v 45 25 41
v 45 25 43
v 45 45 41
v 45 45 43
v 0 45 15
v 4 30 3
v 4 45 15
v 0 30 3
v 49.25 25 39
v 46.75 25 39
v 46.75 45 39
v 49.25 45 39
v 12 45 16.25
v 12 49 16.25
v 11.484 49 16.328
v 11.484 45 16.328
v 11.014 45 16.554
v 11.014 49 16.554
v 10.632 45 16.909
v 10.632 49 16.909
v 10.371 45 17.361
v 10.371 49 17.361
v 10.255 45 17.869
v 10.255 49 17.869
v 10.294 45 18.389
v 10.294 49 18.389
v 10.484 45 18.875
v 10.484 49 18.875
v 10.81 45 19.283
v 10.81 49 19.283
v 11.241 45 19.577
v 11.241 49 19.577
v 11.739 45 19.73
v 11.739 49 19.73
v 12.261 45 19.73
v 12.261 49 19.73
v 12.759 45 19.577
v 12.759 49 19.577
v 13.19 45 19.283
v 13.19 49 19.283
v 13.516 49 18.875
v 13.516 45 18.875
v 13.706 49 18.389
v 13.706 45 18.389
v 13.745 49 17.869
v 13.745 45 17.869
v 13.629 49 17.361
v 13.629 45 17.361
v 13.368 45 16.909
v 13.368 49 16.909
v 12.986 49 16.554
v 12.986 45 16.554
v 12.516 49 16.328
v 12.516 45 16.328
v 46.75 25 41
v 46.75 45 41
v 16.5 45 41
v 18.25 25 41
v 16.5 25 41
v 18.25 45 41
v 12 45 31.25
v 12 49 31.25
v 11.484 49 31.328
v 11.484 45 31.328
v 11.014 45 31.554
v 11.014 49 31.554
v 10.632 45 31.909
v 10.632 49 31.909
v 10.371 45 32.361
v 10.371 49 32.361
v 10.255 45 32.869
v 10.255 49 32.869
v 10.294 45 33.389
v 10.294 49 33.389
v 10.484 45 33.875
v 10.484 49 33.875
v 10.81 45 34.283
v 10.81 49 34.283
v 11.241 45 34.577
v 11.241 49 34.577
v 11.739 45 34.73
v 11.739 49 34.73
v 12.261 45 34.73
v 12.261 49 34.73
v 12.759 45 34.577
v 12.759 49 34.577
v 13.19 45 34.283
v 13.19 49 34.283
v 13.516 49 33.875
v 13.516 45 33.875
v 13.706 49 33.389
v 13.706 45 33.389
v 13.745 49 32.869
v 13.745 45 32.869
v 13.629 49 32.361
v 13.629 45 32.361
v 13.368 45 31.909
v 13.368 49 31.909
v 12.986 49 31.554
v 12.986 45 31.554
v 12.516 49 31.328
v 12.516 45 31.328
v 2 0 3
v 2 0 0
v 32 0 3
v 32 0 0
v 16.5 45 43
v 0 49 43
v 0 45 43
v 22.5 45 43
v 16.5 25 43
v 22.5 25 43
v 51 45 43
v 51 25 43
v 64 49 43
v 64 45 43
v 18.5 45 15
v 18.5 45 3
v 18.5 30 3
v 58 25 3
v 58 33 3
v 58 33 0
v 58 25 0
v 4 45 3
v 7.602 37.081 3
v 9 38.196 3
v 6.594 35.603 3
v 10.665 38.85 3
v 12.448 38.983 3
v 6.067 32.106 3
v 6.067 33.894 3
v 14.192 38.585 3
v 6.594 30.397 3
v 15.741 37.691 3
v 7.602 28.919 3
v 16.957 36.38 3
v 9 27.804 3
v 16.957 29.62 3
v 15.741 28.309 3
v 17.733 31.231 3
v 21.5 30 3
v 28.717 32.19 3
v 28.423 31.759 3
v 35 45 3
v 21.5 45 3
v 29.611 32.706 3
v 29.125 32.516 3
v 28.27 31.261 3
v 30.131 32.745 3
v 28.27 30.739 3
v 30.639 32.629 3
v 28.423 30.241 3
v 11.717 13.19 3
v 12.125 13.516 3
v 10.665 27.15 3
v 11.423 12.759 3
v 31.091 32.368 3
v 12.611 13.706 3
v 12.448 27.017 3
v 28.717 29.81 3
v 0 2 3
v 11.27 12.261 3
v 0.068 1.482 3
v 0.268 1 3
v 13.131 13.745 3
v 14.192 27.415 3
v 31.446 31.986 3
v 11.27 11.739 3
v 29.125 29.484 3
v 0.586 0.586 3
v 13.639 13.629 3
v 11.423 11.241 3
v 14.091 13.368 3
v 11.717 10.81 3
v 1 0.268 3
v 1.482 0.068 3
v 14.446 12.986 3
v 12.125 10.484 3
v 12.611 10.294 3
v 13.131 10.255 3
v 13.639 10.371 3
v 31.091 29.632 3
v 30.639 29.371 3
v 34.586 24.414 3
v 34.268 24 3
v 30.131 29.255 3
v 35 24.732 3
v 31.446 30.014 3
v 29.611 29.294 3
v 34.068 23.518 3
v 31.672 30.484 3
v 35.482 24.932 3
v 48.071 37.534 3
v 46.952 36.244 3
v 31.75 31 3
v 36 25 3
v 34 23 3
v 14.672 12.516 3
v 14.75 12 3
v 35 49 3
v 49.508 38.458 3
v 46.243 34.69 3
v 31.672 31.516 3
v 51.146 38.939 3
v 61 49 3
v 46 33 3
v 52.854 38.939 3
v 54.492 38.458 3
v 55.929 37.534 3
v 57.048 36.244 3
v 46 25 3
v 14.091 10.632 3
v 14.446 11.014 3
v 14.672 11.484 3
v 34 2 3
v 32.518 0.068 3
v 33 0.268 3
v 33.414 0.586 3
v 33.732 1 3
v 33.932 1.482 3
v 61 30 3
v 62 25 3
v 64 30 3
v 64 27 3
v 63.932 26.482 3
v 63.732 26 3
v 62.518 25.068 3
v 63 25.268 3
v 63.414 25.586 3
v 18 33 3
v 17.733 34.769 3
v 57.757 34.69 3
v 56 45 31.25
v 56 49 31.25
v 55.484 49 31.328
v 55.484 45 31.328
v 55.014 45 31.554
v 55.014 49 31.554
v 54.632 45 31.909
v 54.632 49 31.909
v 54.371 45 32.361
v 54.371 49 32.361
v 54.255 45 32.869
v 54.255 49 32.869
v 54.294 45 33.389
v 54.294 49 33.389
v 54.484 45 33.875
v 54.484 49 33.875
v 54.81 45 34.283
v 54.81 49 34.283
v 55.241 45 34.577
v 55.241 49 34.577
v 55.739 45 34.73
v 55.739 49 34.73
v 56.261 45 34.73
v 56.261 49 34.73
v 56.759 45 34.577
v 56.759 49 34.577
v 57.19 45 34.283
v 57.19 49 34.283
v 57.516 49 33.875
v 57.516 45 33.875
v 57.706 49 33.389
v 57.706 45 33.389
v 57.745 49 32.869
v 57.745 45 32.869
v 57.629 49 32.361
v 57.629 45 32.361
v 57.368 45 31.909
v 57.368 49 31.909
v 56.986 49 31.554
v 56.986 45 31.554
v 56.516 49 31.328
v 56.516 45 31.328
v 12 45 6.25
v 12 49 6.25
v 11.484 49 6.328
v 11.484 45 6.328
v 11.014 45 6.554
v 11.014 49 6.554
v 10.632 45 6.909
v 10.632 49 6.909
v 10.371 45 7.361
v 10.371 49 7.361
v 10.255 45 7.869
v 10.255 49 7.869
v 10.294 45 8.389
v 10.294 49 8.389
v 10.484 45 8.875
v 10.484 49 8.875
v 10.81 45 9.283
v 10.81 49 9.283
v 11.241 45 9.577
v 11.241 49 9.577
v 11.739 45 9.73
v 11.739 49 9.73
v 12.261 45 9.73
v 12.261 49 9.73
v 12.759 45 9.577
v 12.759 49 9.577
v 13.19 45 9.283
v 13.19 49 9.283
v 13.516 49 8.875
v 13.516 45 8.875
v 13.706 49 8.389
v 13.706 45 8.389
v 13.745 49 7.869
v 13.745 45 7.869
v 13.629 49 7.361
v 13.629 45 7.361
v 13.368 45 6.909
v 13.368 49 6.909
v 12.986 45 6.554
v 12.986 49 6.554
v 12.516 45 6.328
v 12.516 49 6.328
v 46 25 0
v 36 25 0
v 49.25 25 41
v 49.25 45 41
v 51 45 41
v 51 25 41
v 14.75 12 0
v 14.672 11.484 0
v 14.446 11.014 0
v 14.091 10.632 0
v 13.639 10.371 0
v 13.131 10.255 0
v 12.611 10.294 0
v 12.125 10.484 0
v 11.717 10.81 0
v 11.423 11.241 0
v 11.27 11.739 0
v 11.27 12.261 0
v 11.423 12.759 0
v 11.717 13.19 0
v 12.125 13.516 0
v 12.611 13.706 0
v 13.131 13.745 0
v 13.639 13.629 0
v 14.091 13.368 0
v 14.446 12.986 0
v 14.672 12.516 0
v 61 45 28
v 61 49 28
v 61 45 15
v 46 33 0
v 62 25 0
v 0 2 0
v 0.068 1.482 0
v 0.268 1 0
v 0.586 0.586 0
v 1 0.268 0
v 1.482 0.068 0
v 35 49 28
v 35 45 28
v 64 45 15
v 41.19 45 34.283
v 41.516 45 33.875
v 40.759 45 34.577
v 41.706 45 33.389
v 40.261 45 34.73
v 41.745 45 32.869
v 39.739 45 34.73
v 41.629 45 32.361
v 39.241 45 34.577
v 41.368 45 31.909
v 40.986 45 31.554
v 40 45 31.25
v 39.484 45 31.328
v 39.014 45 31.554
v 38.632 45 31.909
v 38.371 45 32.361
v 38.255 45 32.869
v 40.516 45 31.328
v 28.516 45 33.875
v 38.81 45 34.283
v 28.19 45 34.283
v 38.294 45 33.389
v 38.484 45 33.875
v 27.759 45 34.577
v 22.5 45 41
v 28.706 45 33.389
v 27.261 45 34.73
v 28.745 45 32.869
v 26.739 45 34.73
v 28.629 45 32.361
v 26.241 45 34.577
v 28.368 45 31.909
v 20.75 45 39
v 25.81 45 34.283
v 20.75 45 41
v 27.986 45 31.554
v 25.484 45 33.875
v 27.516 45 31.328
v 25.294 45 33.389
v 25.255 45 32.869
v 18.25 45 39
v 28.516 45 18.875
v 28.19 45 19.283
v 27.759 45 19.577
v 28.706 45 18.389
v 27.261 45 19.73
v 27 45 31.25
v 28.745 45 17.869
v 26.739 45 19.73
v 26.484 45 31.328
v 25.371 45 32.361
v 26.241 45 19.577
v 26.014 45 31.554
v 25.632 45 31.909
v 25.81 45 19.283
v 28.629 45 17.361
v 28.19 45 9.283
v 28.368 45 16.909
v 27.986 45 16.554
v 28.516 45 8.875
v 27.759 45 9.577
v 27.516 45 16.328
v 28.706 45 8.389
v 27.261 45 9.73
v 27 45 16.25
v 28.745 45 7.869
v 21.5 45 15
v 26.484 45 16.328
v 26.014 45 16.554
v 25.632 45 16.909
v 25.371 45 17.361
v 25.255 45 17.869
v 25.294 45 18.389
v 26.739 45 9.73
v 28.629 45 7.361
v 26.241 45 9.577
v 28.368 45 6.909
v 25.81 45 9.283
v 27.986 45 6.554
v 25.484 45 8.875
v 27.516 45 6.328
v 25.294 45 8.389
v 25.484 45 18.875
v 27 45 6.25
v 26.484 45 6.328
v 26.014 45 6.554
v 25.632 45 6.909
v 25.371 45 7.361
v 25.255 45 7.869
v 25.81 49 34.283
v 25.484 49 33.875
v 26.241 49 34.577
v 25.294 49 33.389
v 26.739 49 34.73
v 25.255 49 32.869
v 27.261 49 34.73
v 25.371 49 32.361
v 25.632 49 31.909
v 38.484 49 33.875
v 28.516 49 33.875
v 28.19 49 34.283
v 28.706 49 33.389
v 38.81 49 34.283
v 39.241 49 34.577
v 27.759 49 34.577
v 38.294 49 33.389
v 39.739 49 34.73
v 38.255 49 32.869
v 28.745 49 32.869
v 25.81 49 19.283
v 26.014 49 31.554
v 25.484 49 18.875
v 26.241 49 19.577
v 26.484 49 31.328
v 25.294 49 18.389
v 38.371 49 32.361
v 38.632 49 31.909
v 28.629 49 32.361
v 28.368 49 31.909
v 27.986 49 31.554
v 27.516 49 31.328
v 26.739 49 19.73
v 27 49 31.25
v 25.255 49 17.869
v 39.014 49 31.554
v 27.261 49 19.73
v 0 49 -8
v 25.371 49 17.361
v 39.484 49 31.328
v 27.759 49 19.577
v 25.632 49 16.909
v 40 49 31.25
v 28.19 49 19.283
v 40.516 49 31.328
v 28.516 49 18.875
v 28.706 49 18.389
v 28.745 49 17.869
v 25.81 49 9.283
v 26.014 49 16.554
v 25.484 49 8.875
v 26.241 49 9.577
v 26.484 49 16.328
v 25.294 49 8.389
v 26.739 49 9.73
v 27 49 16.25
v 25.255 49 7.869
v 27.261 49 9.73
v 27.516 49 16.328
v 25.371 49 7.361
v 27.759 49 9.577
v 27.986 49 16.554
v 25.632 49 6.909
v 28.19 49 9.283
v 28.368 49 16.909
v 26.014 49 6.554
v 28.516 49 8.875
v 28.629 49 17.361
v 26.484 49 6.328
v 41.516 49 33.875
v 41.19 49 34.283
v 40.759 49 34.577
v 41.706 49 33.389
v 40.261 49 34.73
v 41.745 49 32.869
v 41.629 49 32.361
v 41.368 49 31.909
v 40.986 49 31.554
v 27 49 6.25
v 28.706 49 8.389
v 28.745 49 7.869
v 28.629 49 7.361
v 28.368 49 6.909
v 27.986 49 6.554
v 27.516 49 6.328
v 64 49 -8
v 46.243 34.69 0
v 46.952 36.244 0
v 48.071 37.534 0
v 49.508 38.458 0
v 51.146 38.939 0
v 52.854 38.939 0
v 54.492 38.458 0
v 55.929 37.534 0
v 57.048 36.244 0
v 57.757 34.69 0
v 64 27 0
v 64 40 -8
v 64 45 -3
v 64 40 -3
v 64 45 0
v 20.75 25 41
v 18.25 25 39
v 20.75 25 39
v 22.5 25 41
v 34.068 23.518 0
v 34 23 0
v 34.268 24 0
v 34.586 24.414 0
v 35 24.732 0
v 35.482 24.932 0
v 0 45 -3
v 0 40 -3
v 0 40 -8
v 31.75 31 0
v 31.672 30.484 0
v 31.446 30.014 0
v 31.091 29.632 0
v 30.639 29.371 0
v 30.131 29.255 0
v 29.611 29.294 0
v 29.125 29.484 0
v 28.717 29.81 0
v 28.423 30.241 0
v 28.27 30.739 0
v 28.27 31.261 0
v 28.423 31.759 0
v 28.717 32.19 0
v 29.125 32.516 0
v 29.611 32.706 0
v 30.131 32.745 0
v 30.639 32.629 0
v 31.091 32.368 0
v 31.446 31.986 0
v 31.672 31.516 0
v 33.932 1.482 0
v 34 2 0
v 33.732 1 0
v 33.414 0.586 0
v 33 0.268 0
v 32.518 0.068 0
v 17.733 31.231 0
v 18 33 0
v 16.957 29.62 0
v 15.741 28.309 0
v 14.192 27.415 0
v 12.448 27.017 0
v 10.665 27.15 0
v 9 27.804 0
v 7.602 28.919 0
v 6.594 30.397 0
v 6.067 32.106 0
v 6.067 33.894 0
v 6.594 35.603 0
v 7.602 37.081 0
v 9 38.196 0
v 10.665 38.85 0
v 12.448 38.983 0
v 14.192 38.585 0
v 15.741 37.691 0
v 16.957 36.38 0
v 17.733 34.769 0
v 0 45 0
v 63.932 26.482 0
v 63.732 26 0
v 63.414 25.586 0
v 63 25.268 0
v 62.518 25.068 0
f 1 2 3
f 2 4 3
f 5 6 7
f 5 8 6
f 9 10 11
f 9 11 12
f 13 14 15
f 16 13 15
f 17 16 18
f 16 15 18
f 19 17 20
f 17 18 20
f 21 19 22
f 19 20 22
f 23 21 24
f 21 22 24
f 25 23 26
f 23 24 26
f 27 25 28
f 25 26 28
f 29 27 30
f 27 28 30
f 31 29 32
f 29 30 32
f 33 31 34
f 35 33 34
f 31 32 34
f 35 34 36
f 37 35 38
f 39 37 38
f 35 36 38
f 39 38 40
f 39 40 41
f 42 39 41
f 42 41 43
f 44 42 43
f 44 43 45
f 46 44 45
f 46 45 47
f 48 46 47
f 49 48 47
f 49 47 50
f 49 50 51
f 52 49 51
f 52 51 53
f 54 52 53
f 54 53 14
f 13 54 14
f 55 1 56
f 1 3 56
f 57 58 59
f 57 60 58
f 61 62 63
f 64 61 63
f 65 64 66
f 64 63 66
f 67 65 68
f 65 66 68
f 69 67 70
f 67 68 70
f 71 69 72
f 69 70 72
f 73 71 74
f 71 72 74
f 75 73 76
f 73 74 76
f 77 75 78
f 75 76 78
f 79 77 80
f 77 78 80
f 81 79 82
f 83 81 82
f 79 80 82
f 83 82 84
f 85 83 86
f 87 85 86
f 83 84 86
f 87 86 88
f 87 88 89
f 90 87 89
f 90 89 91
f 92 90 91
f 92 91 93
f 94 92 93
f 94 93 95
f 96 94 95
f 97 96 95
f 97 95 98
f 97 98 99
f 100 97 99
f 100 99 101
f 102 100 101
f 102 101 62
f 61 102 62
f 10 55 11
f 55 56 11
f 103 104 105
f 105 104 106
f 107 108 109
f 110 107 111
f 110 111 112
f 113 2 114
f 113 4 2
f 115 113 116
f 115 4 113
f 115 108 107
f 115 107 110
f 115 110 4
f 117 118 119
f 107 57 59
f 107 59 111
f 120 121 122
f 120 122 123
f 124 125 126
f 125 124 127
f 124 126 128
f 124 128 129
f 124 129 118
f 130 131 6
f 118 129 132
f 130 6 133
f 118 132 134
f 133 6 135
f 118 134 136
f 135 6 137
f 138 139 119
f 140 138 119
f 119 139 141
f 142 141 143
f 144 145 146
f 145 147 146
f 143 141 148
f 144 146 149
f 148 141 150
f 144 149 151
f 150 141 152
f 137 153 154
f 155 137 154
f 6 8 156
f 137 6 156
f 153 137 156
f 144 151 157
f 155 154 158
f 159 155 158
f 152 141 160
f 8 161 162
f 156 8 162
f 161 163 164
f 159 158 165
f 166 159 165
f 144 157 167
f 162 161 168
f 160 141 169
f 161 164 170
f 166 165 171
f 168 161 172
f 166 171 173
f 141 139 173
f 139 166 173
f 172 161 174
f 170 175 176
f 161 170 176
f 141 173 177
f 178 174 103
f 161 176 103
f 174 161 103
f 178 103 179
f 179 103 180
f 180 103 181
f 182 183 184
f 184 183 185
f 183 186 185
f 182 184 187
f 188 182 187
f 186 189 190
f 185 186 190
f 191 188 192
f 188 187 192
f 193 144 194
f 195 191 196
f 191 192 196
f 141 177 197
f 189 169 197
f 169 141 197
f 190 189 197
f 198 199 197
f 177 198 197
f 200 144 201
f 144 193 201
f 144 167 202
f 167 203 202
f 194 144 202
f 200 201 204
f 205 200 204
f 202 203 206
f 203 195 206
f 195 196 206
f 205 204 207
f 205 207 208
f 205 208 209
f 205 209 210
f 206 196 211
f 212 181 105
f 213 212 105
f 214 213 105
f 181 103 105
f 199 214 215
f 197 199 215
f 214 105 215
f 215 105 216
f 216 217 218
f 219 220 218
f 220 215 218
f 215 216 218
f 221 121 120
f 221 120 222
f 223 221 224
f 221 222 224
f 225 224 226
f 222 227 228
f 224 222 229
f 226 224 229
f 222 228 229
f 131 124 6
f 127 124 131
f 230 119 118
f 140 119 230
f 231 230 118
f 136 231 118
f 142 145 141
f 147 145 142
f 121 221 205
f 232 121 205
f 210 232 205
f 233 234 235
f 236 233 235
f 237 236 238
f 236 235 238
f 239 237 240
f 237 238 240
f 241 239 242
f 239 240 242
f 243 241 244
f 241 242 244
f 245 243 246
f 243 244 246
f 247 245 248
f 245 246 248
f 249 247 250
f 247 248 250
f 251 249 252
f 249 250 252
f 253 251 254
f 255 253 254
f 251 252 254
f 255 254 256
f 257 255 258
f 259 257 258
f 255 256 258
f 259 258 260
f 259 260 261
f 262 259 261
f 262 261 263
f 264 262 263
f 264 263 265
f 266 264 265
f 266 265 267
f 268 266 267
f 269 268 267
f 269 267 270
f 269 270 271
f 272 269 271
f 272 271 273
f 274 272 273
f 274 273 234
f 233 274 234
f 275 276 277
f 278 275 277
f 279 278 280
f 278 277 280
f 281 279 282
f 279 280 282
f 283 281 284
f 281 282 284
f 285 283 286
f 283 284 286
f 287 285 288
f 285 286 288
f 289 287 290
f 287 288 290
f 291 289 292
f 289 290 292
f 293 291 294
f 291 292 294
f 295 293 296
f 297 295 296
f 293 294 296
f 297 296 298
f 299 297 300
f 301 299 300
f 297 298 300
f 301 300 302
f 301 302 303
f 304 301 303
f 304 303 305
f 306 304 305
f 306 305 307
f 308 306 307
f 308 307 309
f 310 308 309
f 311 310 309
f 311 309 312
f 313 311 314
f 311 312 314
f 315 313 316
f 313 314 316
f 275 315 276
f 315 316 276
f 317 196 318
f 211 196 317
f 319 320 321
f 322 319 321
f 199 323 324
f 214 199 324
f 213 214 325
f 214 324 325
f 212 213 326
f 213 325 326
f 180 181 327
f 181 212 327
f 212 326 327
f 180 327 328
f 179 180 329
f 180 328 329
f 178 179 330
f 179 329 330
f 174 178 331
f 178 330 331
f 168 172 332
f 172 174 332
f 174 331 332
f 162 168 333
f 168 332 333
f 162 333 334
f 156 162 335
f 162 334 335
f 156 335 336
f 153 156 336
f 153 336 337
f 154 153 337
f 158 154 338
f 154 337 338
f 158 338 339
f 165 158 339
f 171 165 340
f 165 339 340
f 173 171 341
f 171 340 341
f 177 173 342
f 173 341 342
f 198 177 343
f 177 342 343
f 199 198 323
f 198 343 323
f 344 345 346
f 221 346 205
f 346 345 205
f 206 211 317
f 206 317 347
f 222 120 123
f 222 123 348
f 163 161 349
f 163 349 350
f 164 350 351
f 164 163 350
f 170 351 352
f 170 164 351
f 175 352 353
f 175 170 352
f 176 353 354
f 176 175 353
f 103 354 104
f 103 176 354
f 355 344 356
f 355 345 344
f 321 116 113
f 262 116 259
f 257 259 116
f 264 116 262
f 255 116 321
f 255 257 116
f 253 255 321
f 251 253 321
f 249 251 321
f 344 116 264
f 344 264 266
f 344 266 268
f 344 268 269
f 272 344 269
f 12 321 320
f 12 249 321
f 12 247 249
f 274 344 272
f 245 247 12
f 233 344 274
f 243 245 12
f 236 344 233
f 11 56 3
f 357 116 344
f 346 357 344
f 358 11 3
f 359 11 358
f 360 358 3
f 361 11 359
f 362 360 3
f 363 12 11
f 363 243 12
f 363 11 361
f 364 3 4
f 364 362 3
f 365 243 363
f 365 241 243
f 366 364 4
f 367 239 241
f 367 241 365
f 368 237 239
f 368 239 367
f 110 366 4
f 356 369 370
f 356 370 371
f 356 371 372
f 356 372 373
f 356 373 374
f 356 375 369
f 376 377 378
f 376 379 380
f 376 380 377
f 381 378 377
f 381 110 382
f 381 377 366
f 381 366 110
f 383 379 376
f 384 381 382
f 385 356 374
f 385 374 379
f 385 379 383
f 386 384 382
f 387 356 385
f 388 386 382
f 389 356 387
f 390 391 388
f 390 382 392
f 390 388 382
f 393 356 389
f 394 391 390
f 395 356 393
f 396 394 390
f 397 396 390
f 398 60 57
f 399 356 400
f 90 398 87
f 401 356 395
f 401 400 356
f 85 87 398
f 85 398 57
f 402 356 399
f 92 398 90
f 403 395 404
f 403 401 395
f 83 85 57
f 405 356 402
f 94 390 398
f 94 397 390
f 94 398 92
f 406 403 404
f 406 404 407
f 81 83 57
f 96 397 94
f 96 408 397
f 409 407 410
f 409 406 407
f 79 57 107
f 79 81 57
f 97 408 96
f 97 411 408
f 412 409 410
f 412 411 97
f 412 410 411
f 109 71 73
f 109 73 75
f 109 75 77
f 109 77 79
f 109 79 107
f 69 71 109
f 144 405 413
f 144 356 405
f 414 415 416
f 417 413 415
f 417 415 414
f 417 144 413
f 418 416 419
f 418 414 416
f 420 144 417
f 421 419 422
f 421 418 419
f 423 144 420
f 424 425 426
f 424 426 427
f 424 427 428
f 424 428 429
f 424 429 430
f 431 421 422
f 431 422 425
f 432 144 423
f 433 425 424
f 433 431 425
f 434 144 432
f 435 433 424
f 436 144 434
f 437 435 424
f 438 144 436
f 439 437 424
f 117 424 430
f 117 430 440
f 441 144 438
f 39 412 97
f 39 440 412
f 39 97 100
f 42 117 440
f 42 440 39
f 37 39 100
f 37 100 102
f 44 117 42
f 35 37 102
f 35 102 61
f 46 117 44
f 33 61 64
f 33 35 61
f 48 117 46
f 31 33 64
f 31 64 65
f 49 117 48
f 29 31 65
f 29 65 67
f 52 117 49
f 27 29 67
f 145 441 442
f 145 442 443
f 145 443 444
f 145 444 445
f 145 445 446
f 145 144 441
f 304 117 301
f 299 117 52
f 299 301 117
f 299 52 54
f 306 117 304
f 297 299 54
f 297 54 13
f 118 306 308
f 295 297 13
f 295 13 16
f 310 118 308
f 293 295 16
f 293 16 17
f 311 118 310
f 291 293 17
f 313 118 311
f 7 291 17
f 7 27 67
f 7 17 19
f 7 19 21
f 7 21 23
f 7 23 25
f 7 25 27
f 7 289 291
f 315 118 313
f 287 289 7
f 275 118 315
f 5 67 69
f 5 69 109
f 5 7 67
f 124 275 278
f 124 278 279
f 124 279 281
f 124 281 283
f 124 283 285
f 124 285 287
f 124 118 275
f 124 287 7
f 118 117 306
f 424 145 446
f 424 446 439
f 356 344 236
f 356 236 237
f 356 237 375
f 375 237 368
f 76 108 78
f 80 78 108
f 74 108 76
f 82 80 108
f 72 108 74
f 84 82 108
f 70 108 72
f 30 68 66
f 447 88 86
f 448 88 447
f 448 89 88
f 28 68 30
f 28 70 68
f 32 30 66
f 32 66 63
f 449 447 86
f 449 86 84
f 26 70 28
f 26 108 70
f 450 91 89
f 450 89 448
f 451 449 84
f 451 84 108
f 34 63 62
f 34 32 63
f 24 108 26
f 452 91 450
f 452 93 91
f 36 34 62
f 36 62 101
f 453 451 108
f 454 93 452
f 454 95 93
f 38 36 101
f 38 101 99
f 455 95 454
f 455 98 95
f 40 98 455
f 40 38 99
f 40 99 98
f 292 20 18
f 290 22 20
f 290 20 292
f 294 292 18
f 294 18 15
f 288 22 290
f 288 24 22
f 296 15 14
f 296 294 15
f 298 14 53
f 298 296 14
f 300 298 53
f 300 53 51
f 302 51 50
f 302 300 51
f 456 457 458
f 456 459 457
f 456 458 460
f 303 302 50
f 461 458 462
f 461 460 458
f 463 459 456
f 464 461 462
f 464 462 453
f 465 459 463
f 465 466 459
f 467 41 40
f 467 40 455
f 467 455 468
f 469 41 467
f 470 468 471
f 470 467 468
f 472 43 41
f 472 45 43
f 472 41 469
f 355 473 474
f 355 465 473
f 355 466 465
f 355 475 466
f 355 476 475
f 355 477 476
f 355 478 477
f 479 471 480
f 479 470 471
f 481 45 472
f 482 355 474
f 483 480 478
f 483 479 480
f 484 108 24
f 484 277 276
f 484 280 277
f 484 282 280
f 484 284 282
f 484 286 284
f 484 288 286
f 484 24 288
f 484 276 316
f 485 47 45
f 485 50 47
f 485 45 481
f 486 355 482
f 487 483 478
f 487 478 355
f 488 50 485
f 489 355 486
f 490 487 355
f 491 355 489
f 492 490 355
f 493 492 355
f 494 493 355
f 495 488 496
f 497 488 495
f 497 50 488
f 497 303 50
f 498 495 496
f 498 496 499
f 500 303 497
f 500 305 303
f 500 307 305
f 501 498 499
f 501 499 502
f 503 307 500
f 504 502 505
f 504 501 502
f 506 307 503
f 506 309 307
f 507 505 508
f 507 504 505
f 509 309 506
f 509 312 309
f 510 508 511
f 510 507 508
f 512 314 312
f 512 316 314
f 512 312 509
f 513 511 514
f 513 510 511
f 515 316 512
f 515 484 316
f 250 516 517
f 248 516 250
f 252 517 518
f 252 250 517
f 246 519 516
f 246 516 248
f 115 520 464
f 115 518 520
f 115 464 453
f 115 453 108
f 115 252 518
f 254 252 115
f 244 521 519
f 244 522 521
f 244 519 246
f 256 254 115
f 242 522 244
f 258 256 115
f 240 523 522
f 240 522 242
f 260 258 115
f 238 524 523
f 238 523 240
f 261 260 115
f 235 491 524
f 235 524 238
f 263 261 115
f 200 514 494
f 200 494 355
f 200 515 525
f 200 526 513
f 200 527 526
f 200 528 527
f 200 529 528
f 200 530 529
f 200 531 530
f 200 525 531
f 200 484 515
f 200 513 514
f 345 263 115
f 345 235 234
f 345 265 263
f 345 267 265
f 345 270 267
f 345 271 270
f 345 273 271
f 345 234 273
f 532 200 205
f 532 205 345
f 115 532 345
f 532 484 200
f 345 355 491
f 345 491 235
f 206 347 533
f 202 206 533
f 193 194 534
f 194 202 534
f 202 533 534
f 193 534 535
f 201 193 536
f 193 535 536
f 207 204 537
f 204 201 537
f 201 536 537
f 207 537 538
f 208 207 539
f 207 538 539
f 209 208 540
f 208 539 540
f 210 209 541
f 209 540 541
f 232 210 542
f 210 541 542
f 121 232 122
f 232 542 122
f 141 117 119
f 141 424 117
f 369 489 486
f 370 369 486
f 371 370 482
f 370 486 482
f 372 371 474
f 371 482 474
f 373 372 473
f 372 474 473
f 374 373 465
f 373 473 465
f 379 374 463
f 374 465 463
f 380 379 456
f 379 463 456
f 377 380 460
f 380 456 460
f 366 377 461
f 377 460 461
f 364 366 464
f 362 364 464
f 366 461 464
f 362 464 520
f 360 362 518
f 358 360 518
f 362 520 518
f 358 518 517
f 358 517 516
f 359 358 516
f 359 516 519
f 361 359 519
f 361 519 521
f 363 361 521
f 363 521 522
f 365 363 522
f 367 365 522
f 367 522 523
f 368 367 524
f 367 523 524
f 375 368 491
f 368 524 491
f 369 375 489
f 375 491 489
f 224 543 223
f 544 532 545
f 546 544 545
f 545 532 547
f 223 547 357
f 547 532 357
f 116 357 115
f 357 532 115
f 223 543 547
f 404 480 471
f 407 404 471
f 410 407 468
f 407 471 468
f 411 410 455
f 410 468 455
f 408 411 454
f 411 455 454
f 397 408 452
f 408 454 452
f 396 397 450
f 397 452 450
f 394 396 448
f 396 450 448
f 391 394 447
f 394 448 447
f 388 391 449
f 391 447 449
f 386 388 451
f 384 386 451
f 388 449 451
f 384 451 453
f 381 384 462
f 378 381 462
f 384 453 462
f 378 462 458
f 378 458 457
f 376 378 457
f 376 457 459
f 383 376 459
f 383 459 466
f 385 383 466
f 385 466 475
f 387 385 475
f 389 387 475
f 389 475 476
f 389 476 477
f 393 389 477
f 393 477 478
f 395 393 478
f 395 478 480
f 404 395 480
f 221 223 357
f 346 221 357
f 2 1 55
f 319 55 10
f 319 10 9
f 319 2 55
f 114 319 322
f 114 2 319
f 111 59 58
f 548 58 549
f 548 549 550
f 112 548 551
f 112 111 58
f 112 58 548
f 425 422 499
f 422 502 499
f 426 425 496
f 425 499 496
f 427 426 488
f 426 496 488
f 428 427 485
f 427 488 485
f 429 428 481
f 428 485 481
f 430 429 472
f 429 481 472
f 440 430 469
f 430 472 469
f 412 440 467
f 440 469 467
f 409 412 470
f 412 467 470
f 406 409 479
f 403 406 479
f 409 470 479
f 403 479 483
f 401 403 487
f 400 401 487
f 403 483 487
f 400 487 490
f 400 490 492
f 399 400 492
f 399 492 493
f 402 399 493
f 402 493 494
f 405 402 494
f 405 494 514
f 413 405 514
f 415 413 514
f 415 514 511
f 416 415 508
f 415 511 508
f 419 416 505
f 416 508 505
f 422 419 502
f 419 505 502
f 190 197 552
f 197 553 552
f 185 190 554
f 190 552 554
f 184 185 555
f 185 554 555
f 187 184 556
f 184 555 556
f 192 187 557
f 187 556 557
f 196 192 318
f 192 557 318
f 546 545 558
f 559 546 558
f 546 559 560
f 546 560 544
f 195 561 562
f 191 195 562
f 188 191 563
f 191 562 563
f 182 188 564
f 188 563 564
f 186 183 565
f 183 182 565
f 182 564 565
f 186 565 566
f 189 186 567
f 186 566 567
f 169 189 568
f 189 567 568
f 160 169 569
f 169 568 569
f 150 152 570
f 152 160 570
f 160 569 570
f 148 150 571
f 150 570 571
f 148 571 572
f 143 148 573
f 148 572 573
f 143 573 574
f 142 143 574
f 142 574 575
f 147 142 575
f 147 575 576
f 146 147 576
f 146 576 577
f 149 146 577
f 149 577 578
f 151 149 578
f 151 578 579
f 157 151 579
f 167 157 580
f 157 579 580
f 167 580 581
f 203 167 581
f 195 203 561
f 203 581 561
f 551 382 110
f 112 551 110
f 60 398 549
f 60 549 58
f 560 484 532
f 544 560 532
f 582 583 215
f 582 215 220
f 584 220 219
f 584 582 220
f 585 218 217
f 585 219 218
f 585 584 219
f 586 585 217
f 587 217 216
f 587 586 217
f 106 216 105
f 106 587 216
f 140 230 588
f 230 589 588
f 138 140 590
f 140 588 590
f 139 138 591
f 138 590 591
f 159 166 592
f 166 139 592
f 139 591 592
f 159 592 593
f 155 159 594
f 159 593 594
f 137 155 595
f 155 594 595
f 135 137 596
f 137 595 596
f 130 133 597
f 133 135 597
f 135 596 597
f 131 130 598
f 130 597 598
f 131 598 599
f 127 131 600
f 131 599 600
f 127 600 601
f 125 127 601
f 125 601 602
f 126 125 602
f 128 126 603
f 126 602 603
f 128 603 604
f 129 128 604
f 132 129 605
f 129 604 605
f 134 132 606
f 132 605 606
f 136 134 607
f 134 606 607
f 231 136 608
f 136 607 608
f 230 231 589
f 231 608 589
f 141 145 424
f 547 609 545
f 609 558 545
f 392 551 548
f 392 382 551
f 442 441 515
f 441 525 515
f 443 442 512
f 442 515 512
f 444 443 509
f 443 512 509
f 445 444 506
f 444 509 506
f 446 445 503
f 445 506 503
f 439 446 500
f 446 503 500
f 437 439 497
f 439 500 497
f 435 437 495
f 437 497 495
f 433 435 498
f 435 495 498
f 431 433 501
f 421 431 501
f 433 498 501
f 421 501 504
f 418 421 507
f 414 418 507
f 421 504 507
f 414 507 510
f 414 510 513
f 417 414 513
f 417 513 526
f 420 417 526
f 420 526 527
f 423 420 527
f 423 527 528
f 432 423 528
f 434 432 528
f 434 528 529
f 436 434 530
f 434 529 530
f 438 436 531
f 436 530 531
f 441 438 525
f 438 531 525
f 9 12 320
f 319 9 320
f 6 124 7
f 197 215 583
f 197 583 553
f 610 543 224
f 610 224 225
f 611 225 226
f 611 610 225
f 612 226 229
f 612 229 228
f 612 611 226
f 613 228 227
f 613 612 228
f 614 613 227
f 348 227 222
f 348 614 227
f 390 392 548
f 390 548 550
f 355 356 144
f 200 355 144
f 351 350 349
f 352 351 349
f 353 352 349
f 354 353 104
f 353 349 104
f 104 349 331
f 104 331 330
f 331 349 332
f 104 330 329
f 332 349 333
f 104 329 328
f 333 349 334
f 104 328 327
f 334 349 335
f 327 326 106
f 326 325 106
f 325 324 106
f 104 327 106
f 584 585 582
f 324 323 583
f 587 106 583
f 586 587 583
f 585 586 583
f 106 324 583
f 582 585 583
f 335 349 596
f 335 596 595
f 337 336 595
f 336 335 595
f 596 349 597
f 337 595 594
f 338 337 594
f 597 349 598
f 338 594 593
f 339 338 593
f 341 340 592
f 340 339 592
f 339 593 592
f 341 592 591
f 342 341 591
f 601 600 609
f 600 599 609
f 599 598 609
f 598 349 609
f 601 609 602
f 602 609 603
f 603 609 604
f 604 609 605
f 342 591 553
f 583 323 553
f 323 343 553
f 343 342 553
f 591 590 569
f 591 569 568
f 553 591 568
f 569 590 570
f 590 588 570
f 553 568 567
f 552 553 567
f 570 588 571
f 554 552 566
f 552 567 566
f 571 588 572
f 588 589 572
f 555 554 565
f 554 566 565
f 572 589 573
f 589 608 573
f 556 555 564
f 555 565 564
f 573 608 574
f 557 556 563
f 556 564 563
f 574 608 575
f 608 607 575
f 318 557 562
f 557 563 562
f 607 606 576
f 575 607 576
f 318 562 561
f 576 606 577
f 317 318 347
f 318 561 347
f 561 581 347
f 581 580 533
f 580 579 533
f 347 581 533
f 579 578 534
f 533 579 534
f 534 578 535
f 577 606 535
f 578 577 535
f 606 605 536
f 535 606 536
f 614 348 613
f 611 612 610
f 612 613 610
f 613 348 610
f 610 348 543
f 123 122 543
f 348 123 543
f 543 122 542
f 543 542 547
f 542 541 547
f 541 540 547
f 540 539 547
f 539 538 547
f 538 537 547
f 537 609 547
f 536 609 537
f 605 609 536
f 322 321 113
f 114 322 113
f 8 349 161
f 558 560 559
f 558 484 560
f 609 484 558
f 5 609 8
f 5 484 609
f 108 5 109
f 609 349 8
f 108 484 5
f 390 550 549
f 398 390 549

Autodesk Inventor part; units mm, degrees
ref_plane "YZ Plane" through (0, 0, 0) normal (1, 0, 0) x (0, 1, 0)
ref_plane "XZ Plane" through (0, 0, 0) normal (0, 1, 0) x (-1, 0, 0)
sketch "Sketch1" plane through (0, 0, 0) normal (0, 0, 1) x (1, 0, 0)
  line L0 (0, 0) -> (64, 0)
  line L1 (64, 0) -> (64, 45)
  line L2 (64, 45) -> (0, 45)
  line L3 (0, 45) -> (0, 0)
  circle A0 centre (12, 33) radius 6
  circle A1 centre (52, 33) radius 6
  circle A2 centre (30, 31) radius 1.75
  circle A3 centre (13, 12) radius 1.75
  dimension "d0" = 64
  dimension "d1" = 45
  dimension "d2" = 12
  dimension "d3" = 12
  dimension "d4" = 12
  dimension "d5" = 12
  dimension "d6" = 3.5
  dimension "d7" = 30
  dimension "d8" = 14
  dimension "d9" = 3.5
  dimension "d10" = 13
  dimension "d11" = 33
extrude "Extrusion1" add sketch "Sketch1" along normal blind 3
sketch "Sketch2" plane through (0, 0, 3) normal (0, 0, 1) x (1, 0, 0)
  line L0 (0, 0) -> (64, 0) projected
  line L1 (64, 0) -> (34, 0)
  line L2 (34, 0) -> (34, 25)
  line L3 (34, 25) -> (64, 25)
  line L4 (64, 25) -> (64, 0)
  dimension "d14" = 30
  dimension "d15" = 25
extrude "Extrusion2" cut sketch "Sketch2" against normal blind 3
fillet "Fillet1" radius 2 4 edges at (34, 25, 1.5) (64, 25, 1.5) (34, 0, 1.5) (0, 0, 1.5)
sketch "Sketch5" plane through (0, 45, 0) normal (0, 1, 0) x (1, 0, 0)
  line L0 (64, -3) -> (0, -3) projected
  line L1 (0, -3) -> (64, -3)
  line L2 (64, -3) -> (64, 8)
  line L3 (64, 8) -> (0, 8)
  line L4 (0, 8) -> (0, -3)
  point P0 (0, 0)
  dimension "d20" = 11
  dimension "d21" = 64
extrude "Extrusion3" add sketch "Sketch5" along normal blind 4
sketch "Sketch6" plane through (0, 0, 3) normal (0, 0, 1) x (1, 0, 0)
  line L0 (0, 49) -> (64, 49) projected
  line L1 (64, 27) -> (64, 49) projected
  line L2 (0, 49) -> (64, 49)
  line L3 (64, 49) -> (64, 45)
  line L4 (64, 45) -> (0, 45)
  line L5 (0, 45) -> (0, 49)
  point P0 (0, 0)
  dimension "d24" = 4
extrude "Extrusion4" add sketch "Sketch6" along normal blind 40
sketch "Sketch7" plane through (0, 45, 3) normal (0, -1, 0) x (1, 0, 0)
  line L0 (61, 20) -> (35, 20)
  line L1 (35, 20) -> (35, 0)
  line L2 (35, 0) -> (61, 0)
  line L3 (61, 0) -> (61, 20)
  line L4 (0, 40) -> (64, 40) projected
  line L5 (64, 0) -> (64, 40) projected
  point P0 (0, -3)
  dimension "d27" = 20
  dimension "d28" = 3
  dimension "d29" = 20
  dimension "d30" = 26
extrude "Extrusion5" cut sketch "Sketch7" against normal blind 40
sketch "Sketch8" plane through (0, 45, 43) normal (0, -1, 0) x (1, 0, 0)
  line L0 (35, -20) -> (61, -20) projected
  line L1 (61, -20) -> (61, -40) projected
  line L2 (35, -40) -> (35, -20) projected
  line L3 (35, -40) -> (0, -40) projected
  point P0 (0, -43)
  point P1 (56, -10)
  point P2 (40, -10)
  point P3 (27, -25)
  point P4 (27, -35)
  point P5 (12, -35)
  point P6 (12, -25)
  point P7 (12, -10)
  point P8 (27, -10)
  dimension "d33" = 10
  dimension "d34" = 10
  dimension "d35" = 5
  dimension "d36" = 5
  dimension "d37" = 5
  dimension "d38" = 8
  dimension "d39" = 8
  dimension "d40" = 5
  dimension "d63" = 15
hole "Hole1" at (56, 45, 33) at (40, 45, 33) at (27, 45, 18) at (27, 45, 8) at (12, 45, 8) at (12, 45, 18) at (12, 45, 33) at (27, 45, 33) direction (0, 1, 0) diameter 3.5 end through all
sketch "Sketch10" plane through (0, 2, 0) normal (-1, 0, 0) x (0, 0, 1)
  line L0 (3, 28) -> (15, 43)
  line L1 (3, 43) -> (43, 43) projected
  line L2 (3, 43) -> (3, 28)
  line L3 (3, 37) -> (3, 25) projected
  line L4 (3, 43) -> (15, 43)
  point P0 (0, -2)
  dimension "d48" = 15
  dimension "d49" = 12
extrude "Extrusion6" add sketch "Sketch10" against normal blind 4
sketch "Sketch11" plane through (64, 27, 3) normal (1, 0, 0) x (0, 0, -1)
  line L0 (0, 0) -> (0, 12) projected
  line L1 (0, 3) -> (0, 18)
  line L2 (0, 18) -> (-12, 18)
  line L3 (0, 18) -> (-20, 18) projected
  line L4 (0, 3) -> (-12, 18)
  point P0 (3, -27)
  dimension "d52" = 12
  dimension "d53" = 15
extrude "Extrusion7" add sketch "Sketch11" against normal blind 3
ref_plane "Work Plane1" through (20, 2, 0) normal (-1, 0, 0) x (0, 0, 1)
sketch "Sketch12" plane through (20, 2, 0) normal (-1, 0, 0) x (0, 0, 1)
  line L0 (3, 43) -> (3, 28) projected
  line L1 (3, 43) -> (3, 28)
  line L2 (15, 43) -> (3, 28) projected
  line L3 (3, 28) -> (15, 43)
  line L4 (15, 43) -> (3, 43)
  point P0 (0, -2)
extrude "Extrusion8" add sketch "Sketch12" along normal mid plane 3
sketch "Sketch13" plane through (0, 45, 0) normal (0, -1, 0) x (1, 0, 0)
  line L0 (0, -8) -> (0, 0) projected
  line L1 (64, -8) -> (64, 43) projected
  line L2 (0, -8) -> (64, -8)
  line L3 (64, -8) -> (64, -3)
  line L4 (64, -3) -> (0, -3)
  line L5 (0, -3) -> (0, -8)
  dimension "d59" = 5
extrude "Extrusion9" add sketch "Sketch13" along normal blind 5
sketch "Sketch14" plane through (0, 45, 43) normal (0, -1, 0) x (1, 0, 0)
  line L0 (64, 0) -> (0, 0) projected
  line L1 (16.5, 0) -> (22.5, 0)
  line L2 (22.5, -2) -> (22.5, 0)
  line L3 (22.5, -2) -> (20.75, -2)
  line L4 (20.75, -2) -> (20.75, -4)
  line L5 (20.75, -4) -> (18.25, -4)
  line L6 (18.25, -4) -> (18.25, -2)
  line L7 (18.25, -2) -> (16.5, -2)
  line L8 (16.5, -2) -> (16.5, 0)
  line L9 (45, 0) -> (45, -2)
  line L10 (45, -2) -> (46.75, -2)
  line L11 (46.75, -2) -> (46.75, -4)
  line L12 (46.75, -4) -> (49.25, -4)
  line L13 (49.25, -4) -> (49.25, -2)
  line L14 (49.25, -2) -> (51, -2)
  line L15 (51, -2) -> (51, 0)
  line L16 (45, 0) -> (51, 0)
  point P0 (0, -43)
  dimension "d64" = 2
  dimension "d65" = 2.5
  dimension "d66" = 6
  dimension "d67" = 2.5
  dimension "d68" = 6
  dimension "d70" = 2
  dimension "d72" = 16.5
  dimension "d73" = 13
extrude "Extrusion10" add sketch "Sketch14" along normal blind 20
sketch "Sketch16" plane through (0, 49, 0) normal (0, 1, 0) x (1, 0, 0)
  line L0 (35, -23) -> (61, -23)
  line L1 (61, -23) -> (61, -28)
  line L2 (61, -28) -> (35, -28)
  line L3 (35, -28) -> (35, -23)
  point P0 (0, 0)
  dimension "d86" = 26
  dimension "d87" = 5
extrude "Extrusion12" cut sketch "Sketch16" against normal blind 10
sketch "Sketch17" plane through (0, 0, 3) normal (0, 0, 1) x (1, 0, 0)
  circle A0 centre (52, 33) radius 6 projected
  line L0 (62, 25) -> (36, 25) projected
  line L1 (46, 33) -> (58, 33)
  line L2 (58, 33) -> (58, 25)
  line L3 (58, 25) -> (46, 25)
  line L4 (46, 25) -> (46, 33)
  point P0 (0, 0)
extrude "Extrusion13" cut sketch "Sketch17" against normal blind 10 contours L2 L0 L4 A0 | A0 L1 picked at (51.2908, 31.13)
equation "\"d3\" = d2"
equation "\"d6\" = d9"
equation "\"d34\" = d33"
equation "\"d36\" = d35"
equation "\"d39\" = d38"
equation "\"d40\" = d37"
equation "\"d67\" = d65"
properties part number "PLACA_BASE"
